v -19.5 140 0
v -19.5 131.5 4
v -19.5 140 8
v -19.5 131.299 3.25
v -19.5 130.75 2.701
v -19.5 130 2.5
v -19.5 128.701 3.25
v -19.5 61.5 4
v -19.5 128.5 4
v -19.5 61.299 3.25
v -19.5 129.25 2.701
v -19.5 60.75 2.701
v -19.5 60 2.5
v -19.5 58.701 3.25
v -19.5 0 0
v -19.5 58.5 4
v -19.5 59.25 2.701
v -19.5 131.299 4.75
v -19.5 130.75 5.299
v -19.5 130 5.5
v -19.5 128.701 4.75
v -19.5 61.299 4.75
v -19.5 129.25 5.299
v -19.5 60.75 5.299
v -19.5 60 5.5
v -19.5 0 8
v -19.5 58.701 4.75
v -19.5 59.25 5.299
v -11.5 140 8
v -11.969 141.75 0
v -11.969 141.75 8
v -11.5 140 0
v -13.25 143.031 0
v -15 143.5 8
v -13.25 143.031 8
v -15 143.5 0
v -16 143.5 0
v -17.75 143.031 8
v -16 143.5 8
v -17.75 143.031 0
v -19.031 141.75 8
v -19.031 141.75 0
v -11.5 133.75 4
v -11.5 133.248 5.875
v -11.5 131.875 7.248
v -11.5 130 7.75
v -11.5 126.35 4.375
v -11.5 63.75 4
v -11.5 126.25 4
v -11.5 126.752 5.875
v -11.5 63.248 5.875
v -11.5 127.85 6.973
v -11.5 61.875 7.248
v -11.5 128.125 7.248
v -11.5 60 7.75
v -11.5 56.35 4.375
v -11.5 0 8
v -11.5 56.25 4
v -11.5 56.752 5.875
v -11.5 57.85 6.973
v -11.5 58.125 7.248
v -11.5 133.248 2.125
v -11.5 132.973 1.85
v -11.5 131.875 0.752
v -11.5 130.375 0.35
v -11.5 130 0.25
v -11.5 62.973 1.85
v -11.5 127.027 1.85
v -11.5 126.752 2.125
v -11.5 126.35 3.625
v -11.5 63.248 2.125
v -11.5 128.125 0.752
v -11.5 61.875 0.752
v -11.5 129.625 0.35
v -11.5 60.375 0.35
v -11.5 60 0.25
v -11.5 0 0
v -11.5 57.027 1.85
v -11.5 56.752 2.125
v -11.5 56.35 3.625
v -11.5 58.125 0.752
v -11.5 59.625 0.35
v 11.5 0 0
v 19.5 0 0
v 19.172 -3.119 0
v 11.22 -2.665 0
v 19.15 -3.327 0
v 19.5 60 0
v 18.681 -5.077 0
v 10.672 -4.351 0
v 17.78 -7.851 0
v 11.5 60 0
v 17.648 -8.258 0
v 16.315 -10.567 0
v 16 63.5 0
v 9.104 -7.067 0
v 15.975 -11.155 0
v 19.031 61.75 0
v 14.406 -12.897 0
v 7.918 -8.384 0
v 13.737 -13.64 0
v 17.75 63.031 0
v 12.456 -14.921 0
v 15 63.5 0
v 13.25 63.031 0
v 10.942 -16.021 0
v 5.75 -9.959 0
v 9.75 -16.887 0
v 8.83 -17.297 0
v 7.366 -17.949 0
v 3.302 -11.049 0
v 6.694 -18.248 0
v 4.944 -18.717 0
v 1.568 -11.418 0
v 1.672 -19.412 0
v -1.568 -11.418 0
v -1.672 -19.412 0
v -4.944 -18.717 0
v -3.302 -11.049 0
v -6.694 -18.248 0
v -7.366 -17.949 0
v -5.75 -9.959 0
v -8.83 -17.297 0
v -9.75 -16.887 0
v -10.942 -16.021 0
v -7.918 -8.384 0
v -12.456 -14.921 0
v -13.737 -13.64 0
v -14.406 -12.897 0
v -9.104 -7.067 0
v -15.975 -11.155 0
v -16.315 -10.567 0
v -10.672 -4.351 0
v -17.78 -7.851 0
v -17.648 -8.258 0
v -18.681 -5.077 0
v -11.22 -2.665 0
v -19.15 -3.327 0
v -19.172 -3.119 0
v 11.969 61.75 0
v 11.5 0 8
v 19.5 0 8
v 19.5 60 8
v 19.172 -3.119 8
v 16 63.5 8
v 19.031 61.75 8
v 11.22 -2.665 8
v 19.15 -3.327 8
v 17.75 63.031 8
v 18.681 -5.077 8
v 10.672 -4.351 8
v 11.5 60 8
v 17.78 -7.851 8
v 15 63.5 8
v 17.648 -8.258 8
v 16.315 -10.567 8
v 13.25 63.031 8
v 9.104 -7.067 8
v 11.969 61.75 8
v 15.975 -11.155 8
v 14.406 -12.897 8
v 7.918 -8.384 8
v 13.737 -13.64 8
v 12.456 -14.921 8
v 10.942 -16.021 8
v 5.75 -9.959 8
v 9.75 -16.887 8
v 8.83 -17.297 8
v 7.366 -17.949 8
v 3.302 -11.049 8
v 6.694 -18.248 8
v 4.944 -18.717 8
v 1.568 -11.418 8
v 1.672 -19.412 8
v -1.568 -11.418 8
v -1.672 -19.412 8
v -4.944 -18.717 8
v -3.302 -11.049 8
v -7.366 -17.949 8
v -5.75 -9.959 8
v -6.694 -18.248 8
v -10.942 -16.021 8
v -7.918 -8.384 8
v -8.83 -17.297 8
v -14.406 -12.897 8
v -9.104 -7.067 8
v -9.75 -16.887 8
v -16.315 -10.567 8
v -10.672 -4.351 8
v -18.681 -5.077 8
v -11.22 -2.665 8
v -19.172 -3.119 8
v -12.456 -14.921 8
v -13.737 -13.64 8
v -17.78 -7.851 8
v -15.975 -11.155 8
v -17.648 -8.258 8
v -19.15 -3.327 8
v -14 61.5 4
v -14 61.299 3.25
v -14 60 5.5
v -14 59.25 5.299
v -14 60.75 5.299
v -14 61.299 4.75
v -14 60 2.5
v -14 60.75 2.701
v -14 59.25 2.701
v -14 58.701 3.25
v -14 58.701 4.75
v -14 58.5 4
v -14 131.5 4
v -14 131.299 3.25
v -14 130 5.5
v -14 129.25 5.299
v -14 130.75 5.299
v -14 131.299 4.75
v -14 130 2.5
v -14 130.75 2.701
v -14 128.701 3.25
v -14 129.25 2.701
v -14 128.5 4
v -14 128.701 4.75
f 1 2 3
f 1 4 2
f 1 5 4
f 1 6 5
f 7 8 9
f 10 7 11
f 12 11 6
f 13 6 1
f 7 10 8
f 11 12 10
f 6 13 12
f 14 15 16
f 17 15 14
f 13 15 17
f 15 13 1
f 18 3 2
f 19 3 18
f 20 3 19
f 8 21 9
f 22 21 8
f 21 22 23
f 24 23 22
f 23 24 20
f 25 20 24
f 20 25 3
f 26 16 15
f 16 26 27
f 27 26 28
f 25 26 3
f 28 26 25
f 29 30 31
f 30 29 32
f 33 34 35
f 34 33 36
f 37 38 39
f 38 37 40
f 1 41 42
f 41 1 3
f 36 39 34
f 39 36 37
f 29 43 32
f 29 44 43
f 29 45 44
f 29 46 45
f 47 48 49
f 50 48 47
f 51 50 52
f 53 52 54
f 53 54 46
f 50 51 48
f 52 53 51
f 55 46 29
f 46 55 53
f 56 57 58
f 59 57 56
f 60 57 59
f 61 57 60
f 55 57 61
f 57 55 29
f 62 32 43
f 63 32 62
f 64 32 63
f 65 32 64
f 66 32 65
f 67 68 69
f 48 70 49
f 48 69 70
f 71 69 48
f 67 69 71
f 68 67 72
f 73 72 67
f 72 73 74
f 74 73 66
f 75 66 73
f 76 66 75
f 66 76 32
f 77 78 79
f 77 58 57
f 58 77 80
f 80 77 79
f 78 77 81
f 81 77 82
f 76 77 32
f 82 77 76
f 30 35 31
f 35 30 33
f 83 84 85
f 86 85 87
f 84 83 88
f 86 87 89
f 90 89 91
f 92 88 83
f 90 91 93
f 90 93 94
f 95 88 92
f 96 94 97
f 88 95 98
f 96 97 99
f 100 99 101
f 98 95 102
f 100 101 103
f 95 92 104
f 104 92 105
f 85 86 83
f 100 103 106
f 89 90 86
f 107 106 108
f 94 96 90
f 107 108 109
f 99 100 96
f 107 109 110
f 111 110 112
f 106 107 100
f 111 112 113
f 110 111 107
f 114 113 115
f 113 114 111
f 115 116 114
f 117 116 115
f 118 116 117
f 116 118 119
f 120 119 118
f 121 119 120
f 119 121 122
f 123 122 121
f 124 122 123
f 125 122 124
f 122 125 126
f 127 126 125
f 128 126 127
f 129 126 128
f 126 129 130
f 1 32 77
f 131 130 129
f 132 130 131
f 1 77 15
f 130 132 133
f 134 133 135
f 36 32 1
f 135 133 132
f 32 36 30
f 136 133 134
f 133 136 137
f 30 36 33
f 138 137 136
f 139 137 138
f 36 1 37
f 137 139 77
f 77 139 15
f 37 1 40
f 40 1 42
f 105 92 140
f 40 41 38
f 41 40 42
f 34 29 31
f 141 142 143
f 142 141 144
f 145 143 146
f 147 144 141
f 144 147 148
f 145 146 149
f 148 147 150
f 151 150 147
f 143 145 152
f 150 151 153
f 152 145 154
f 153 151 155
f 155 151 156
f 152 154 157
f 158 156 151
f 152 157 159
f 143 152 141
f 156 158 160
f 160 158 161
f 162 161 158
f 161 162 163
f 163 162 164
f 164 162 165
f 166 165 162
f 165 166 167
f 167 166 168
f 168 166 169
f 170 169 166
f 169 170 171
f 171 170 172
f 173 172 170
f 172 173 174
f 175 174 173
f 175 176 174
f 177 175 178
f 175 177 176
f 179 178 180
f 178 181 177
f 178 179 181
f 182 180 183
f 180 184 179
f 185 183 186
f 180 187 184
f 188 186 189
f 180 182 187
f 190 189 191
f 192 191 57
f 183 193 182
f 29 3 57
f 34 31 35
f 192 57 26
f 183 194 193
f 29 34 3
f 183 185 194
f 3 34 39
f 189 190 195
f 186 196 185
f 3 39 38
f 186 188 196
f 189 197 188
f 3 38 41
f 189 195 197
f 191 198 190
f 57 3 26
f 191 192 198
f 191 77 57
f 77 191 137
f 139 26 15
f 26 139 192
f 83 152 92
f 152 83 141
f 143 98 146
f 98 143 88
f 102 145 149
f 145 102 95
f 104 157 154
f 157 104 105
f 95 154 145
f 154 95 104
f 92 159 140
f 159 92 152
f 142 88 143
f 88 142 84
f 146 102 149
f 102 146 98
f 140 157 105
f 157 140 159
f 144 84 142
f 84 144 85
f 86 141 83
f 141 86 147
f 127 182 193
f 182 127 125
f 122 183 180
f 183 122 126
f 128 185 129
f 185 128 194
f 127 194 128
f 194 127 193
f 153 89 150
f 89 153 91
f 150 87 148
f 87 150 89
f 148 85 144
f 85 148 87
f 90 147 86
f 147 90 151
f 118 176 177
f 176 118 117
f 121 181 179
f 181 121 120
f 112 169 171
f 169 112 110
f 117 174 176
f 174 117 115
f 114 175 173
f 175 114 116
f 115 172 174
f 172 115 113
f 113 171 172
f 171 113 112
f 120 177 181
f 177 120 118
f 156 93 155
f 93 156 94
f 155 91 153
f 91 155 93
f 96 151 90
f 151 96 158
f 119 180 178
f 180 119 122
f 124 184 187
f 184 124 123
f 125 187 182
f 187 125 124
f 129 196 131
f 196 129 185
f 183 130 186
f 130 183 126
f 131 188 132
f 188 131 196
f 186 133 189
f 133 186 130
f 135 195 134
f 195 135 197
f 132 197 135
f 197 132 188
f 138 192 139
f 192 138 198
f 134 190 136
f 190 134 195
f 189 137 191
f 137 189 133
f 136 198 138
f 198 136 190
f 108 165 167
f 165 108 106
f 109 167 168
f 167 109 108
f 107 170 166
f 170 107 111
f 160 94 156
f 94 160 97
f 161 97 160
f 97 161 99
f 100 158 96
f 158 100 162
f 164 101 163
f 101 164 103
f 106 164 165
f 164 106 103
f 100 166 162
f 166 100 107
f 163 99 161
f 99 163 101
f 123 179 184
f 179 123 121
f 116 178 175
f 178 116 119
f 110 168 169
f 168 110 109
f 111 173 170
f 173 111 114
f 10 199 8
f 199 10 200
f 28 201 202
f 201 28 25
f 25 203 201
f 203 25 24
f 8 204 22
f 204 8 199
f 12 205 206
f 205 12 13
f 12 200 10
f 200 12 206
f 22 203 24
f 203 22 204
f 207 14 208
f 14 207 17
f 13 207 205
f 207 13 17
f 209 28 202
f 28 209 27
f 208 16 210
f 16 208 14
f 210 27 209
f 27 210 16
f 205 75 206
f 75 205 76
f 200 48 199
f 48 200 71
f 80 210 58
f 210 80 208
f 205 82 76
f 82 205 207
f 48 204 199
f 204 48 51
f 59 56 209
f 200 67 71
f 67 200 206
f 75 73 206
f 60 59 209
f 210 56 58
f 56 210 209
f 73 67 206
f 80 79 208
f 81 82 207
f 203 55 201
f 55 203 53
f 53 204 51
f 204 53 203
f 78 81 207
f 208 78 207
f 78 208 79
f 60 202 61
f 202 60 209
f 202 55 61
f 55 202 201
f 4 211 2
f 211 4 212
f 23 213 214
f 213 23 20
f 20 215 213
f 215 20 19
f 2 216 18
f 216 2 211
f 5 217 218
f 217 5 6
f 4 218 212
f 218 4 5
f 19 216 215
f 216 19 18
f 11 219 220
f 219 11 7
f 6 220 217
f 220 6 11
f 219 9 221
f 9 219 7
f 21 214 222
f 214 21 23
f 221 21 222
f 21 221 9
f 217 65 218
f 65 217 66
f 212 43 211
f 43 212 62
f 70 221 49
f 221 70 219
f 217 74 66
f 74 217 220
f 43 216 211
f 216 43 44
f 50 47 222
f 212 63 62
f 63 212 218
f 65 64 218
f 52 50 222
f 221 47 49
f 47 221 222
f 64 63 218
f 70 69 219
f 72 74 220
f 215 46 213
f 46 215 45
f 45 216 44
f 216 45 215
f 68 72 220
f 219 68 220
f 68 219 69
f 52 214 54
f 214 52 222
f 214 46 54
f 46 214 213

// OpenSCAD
width=8;
thick=8;
rad=23/2+thick/2;
roundrad=3.5; //less than thick/2
height=140;
theight=60;
roundsegs=12;

sthick=thick-roundrad*2;

wall_hook();

module wall_hook()
{
	difference(){
    	translate([0,0,0.5])

	minkowski(){
	union() {
		// hook
		difference() {
			cylinder(h=width-1, r=rad+sthick/2);
			translate(v=[0,0,-1]) cylinder(h=width+1, r=rad-sthick/2);
			translate(v=[-rad-sthick,0,-1]) cube(size=[2*rad+2*sthick,rad+sthick,width+4]);
		}
// wall 
		translate(v=[-rad-sthick/2,0,0]) cube(size=[sthick,height,width-1]);
// end-tip
		translate(v=[rad-sthick/2,0,0]) cube(size=[sthick,theight,width-1]);
	}
	cylinder(h=1,r=roundrad,$fn=roundsegs,center=true);
}


			// screw hole
	translate(v=[-rad,height-10,width/2]) rotate(a=[0,90,0]) cylinder(h=15, r=1.5, $fn=12,center=true);
	translate(v=[-rad+thick/2,height-10,width/2]) rotate(a=[0,90,0]) cylinder(h=5, r1=1.5, r2=6,$fn=12,center=true);
if (height>30) {
	translate(v=[-rad,theight,width/2]) rotate(a=[0,90,0]) cylinder(h=15, r=1.5, $fn=12,center=true);
	translate(v=[-rad+thick/2,theight,width/2]) rotate(a=[0,90,0]) cylinder(h=5, r1=1.5, r2=6,$fn=12,center=true);

}
}
}
